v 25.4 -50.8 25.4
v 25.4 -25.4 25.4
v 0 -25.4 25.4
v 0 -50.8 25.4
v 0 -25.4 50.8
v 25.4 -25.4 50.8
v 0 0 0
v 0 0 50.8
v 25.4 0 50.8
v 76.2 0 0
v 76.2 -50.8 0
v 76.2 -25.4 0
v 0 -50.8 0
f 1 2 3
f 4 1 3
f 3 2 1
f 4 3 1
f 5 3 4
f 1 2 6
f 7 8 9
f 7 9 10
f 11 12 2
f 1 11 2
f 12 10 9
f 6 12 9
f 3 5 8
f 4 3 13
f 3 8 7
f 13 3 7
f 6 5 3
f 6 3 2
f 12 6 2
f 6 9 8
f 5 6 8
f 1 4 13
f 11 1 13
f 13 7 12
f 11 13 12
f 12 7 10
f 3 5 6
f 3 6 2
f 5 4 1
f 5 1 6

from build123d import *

# Parameters (mm, degrees)
F1_DEPTH = 25.4
F2_DEPTH = 50.8
F4_DEPTH = 25.4


with BuildPart() as f1:
    # F0 (on Front) → F1 (new body)
    with BuildSketch(Plane.XZ):
        Polygon((25.4, 25.4), (76.2, 0), (25.4, 50.8), (0, 50.8), (0, 25.4), align=None)
    extrude(amount=F1_DEPTH)

    # F0 (on Front) → F2 (join)
    with BuildSketch(Plane.XZ):
        Polygon((0, 25.4), (0, 0), (76.2, 0), (25.4, 25.4), align=None)
    extrude(amount=F2_DEPTH)


with BuildPart() as f4:
    # F3 (on face) → F4 (new body)
    with BuildSketch(Plane(origin=(0, 0, 0), x_dir=(0, -1, 0), z_dir=(-1, 0, 0))):
        Polygon((25.4, 25.4), (50.8, 25.4), (25.4, 50.8), align=None)
    extrude(amount=-F4_DEPTH)


solid = Compound([f1.part, f4.part])
